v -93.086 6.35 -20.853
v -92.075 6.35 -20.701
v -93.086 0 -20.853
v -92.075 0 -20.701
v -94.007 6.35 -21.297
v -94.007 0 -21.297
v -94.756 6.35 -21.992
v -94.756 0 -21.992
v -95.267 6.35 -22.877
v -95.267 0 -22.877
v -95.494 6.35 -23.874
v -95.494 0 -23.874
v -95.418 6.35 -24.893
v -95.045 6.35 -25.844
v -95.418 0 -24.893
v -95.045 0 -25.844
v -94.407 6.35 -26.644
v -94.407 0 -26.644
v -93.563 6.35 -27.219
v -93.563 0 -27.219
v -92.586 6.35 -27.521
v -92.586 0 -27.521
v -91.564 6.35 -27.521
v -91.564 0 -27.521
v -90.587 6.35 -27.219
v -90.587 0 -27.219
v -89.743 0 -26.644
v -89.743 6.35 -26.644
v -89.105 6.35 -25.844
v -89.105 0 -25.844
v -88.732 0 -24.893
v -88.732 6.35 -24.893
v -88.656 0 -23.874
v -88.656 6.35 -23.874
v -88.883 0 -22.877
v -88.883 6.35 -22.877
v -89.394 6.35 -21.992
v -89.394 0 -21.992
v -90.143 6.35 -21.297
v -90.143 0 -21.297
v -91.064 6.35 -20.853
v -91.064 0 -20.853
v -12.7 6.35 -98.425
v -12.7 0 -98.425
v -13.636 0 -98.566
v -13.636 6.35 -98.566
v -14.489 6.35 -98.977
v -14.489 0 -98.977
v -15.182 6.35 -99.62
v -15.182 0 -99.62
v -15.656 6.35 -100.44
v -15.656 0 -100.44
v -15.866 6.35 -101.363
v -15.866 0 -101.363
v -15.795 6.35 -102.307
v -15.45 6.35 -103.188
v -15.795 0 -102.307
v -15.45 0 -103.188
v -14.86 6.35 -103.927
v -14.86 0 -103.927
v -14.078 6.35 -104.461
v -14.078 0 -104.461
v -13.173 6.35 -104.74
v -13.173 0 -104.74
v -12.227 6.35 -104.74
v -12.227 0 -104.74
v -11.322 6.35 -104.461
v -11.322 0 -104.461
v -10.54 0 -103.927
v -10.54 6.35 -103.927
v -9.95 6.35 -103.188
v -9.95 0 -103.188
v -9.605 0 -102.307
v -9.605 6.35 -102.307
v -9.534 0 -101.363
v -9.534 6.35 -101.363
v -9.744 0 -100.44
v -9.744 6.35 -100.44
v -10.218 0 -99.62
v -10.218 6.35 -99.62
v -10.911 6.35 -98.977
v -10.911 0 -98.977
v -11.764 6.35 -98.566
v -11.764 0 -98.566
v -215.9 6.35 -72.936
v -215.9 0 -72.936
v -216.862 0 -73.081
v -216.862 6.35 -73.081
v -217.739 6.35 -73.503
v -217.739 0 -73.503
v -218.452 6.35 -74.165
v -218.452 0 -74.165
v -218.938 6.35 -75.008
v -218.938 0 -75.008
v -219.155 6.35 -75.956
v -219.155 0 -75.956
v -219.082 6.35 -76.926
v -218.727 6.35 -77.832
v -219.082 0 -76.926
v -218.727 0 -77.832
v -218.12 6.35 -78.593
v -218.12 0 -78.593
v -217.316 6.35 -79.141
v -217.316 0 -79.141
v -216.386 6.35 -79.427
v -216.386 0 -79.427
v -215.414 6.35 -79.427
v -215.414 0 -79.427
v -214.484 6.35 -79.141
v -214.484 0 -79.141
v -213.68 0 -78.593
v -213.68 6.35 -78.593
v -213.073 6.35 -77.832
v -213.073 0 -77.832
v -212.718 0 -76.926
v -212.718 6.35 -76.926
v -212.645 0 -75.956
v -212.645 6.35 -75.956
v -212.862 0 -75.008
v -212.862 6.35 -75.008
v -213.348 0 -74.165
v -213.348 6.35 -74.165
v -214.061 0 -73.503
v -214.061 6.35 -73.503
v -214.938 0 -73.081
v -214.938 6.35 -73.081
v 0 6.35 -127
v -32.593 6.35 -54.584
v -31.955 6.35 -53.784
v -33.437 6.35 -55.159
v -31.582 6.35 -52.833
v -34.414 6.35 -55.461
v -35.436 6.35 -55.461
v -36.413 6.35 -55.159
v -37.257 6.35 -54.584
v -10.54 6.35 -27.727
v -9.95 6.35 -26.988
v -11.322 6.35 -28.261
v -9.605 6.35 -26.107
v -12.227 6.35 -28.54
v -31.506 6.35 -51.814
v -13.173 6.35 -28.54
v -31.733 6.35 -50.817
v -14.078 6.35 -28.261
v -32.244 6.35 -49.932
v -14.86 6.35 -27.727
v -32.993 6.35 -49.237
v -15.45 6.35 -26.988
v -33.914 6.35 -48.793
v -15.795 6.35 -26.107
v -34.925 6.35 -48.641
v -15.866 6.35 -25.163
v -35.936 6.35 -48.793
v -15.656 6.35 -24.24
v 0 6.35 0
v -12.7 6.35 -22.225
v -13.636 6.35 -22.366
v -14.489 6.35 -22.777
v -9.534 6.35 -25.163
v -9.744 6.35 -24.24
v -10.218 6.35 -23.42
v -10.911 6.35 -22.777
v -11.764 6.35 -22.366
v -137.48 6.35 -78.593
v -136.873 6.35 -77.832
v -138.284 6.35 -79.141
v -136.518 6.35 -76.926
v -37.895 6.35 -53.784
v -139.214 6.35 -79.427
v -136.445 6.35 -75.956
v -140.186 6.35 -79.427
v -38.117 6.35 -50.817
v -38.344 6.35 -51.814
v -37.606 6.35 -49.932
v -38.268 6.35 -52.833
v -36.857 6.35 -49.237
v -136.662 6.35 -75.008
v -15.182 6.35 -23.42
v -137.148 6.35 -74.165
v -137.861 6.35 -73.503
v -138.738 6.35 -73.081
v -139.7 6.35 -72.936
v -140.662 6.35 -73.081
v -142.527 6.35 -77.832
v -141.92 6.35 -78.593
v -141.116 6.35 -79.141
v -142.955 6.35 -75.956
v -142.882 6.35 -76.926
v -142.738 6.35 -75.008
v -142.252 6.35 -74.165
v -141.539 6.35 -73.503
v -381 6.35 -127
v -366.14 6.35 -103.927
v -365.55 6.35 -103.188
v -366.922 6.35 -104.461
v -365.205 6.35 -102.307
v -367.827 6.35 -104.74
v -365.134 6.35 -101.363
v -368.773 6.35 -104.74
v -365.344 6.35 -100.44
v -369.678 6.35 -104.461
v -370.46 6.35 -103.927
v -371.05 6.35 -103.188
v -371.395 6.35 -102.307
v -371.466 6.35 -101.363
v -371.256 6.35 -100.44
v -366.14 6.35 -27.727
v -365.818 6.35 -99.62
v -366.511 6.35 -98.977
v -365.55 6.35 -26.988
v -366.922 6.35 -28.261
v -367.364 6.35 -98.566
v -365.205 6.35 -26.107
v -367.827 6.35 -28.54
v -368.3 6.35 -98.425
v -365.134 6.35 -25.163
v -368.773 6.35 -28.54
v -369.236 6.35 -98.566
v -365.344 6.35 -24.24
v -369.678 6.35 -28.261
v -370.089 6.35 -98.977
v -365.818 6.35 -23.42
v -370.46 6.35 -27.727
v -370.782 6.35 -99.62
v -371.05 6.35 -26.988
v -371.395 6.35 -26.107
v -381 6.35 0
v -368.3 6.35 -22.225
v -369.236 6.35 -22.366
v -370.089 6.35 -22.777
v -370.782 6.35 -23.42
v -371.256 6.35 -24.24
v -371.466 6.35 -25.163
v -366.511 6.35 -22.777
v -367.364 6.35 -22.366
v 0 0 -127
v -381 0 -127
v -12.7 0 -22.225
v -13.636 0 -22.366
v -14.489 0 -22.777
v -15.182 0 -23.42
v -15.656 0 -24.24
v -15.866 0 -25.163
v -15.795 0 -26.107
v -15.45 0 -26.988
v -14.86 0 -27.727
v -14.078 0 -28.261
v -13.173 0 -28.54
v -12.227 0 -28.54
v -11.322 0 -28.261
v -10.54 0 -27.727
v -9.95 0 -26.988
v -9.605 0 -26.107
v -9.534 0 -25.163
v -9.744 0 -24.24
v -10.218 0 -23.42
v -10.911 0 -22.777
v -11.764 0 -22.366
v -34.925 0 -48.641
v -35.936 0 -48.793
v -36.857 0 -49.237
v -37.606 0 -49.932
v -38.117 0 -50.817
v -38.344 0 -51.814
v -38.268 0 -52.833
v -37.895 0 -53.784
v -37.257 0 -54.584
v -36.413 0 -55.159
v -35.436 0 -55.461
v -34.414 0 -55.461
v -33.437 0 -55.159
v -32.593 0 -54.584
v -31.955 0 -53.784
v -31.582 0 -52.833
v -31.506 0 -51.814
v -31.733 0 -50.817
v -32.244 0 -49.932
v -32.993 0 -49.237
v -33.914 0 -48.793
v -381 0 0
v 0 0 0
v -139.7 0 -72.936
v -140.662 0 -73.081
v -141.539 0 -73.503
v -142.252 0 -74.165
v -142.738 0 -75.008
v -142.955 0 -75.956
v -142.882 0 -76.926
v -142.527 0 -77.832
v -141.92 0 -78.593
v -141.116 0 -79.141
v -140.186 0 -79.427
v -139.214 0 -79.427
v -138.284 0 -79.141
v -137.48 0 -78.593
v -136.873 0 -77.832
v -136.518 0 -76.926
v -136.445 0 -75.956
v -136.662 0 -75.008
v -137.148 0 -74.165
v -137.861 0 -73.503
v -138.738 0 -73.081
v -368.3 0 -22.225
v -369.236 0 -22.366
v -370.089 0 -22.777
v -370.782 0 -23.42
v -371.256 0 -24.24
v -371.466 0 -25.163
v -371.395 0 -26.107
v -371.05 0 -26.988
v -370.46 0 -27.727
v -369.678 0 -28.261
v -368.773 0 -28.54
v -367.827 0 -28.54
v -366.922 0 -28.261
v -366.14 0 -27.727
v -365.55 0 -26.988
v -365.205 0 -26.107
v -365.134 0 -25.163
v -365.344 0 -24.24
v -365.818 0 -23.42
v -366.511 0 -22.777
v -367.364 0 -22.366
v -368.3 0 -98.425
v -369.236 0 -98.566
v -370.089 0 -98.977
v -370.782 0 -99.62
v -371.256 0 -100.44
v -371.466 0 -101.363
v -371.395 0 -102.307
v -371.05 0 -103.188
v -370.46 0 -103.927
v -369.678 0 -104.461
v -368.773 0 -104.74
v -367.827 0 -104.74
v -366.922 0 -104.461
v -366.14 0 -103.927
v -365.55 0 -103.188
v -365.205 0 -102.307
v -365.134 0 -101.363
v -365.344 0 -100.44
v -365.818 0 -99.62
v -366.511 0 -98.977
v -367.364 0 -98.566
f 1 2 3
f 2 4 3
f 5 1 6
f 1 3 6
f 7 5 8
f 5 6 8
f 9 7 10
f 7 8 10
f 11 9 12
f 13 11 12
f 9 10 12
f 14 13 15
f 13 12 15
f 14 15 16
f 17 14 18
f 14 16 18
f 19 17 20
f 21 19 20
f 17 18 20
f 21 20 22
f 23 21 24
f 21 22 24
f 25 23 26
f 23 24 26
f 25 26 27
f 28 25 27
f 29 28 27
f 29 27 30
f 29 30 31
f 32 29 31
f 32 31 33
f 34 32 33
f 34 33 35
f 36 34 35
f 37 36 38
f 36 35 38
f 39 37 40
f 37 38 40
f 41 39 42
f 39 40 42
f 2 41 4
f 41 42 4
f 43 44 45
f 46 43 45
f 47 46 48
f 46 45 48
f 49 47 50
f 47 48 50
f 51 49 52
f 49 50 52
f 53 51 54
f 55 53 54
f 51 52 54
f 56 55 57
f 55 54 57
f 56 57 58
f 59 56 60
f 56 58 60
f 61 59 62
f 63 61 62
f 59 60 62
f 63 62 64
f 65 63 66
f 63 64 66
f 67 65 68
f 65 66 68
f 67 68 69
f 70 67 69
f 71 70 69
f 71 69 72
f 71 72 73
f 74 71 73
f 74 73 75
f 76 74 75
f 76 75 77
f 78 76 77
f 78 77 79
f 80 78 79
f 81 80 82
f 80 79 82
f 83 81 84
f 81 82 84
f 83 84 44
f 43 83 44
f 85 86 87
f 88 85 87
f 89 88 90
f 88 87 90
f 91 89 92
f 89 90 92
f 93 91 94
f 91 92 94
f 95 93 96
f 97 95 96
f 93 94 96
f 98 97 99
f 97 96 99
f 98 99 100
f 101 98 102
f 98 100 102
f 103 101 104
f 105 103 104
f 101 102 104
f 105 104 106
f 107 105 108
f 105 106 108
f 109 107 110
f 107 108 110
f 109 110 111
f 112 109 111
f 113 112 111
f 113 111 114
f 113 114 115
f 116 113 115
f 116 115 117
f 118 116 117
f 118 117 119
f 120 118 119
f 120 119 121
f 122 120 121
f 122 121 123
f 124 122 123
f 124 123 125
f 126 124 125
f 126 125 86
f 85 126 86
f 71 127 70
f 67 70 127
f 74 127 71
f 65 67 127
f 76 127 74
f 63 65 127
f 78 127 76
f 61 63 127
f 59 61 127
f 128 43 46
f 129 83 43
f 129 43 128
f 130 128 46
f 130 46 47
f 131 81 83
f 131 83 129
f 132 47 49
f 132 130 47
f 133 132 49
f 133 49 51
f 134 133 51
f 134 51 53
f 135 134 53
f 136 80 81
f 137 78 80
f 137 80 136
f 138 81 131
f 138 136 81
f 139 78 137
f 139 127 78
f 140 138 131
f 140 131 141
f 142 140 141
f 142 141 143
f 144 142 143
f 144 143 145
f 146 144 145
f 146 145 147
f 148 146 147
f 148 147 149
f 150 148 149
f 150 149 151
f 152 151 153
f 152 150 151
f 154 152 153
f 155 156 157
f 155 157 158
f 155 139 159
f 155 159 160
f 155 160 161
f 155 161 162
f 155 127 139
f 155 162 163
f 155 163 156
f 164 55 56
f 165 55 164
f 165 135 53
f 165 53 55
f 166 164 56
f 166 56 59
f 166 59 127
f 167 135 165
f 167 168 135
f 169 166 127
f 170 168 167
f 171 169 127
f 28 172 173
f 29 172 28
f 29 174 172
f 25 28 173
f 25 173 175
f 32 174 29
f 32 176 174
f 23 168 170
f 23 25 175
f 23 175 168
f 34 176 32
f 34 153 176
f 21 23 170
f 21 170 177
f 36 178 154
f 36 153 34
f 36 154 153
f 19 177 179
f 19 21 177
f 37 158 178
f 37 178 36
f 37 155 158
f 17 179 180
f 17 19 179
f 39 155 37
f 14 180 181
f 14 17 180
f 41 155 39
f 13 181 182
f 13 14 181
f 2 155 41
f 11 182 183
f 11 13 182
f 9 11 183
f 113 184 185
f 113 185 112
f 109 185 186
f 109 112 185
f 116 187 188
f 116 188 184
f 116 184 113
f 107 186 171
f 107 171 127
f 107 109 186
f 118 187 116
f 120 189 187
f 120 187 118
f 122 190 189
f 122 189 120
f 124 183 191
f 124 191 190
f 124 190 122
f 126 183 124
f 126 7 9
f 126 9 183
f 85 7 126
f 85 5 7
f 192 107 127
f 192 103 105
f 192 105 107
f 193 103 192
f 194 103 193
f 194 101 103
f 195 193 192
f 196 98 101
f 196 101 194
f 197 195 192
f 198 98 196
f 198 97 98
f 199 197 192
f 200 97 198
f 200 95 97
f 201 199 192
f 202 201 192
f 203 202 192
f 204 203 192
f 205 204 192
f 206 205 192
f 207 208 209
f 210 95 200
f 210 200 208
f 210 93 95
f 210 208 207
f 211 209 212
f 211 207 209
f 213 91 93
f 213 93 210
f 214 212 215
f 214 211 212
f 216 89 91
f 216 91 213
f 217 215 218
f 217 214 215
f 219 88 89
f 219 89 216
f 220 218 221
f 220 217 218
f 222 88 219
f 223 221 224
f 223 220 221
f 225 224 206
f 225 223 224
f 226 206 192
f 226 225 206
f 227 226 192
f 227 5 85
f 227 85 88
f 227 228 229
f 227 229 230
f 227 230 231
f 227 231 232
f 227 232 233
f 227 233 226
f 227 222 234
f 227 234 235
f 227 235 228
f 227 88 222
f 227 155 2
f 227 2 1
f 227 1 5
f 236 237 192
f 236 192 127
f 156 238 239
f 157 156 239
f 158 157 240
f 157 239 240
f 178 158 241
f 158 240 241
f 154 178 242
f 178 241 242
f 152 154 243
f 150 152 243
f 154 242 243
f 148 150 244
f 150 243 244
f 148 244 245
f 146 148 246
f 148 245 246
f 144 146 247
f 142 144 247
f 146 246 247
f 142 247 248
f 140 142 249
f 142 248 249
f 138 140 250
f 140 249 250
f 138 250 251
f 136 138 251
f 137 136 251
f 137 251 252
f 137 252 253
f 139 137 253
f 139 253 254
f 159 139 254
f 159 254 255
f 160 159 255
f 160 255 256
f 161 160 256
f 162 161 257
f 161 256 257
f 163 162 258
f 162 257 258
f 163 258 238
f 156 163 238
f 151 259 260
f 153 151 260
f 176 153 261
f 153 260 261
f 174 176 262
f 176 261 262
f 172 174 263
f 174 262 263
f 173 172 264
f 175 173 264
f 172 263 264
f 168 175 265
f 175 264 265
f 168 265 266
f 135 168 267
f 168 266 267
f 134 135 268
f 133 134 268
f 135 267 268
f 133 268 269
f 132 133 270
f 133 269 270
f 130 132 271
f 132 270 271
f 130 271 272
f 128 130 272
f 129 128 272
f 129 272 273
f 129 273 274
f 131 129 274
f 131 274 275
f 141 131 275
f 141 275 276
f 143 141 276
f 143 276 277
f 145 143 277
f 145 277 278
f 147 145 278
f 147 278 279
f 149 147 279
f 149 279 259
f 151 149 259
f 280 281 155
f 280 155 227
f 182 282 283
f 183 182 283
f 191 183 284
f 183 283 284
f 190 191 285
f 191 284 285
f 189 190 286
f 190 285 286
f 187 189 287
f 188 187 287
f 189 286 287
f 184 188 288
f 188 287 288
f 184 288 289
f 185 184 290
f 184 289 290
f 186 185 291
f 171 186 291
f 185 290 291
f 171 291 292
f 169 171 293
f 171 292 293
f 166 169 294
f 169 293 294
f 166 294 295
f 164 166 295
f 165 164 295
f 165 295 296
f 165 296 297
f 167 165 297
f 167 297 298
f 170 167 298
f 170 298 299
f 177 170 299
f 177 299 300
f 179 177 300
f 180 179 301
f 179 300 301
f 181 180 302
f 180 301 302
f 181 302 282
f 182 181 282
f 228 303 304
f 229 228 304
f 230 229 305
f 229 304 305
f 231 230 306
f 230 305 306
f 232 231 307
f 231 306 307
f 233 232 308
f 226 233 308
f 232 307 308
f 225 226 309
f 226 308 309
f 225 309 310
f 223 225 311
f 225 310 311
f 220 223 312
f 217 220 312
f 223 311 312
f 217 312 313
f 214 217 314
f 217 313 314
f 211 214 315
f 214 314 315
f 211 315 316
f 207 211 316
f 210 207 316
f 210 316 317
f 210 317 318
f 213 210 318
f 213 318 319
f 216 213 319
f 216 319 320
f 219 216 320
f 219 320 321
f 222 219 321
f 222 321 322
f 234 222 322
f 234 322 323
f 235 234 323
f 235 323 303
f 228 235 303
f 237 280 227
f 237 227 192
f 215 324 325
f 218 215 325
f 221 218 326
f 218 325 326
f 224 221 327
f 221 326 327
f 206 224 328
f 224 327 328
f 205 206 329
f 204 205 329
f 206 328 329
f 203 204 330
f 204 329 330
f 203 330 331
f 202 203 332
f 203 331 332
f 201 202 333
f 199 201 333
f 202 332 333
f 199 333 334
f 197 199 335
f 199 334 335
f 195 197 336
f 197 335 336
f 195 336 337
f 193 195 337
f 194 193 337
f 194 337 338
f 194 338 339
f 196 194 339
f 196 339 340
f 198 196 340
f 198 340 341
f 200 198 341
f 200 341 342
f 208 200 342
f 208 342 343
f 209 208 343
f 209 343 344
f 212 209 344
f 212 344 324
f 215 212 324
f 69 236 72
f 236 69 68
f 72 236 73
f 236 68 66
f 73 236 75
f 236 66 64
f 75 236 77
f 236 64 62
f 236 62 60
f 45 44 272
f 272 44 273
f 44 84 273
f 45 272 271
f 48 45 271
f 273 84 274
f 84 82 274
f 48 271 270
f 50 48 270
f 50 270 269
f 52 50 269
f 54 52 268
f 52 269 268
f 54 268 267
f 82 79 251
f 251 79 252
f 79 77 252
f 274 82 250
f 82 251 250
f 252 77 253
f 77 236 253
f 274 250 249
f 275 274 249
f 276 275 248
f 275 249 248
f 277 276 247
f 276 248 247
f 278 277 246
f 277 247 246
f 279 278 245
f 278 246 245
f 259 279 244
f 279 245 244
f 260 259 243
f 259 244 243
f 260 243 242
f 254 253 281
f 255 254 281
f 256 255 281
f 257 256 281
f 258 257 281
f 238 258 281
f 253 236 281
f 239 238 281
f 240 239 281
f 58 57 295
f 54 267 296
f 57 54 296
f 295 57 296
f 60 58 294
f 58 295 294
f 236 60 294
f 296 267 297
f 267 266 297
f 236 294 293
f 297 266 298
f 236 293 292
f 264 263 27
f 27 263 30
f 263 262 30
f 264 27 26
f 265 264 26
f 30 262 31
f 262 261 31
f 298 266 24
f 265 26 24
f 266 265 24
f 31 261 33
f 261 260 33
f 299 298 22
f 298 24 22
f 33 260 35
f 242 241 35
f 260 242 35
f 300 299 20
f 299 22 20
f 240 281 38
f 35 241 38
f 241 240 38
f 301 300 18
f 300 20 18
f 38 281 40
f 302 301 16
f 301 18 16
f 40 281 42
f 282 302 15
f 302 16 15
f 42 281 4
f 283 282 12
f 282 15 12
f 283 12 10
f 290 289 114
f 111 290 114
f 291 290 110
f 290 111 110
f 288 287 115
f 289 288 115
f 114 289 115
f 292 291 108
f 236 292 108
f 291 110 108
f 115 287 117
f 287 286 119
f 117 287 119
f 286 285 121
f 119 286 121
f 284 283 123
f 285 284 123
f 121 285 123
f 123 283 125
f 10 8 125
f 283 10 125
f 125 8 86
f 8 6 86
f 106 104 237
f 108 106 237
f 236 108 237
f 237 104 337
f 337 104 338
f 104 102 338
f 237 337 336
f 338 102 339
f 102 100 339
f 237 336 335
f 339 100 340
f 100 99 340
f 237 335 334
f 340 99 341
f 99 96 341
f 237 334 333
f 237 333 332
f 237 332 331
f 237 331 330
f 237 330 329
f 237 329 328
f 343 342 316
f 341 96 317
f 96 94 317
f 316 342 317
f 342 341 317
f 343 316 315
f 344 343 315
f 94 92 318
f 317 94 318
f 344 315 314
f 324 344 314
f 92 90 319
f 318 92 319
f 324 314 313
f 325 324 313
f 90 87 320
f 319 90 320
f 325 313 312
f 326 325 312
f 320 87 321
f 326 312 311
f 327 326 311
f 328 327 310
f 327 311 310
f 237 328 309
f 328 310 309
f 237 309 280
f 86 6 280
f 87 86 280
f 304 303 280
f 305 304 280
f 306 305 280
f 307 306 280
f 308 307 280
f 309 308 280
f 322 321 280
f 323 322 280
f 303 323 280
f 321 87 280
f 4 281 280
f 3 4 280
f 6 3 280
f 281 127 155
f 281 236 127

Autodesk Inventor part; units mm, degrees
ref_plane "YZ Plane" through (0, 0, 0) normal (1, 0, 0) x (0, 1, 0)
ref_plane "XZ Plane" through (0, 0, 0) normal (0, 1, 0) x (-1, 0, 0)
ref_plane "XY Plane" through (0, 0, 0) normal (0, 0, 1) x (1, 0, 0)
sketch "Sketch1" plane through (0, 0, 0) normal (0, 1, 0) x (-1, 0, 0)
  line L0 (0, 0) -> (381, 0)
  line L1 (381, 0) -> (381, -127)
  line L2 (381, -127) -> (0, -127)
  line L3 (0, -127) -> (0, 0)
  dimension "d0" = 381
  dimension "d1" = 127
extrude "Extrusion1" add sketch "Sketch1" along normal blind 6.35
sketch "Sketch2" plane through (0, 6.35, 0) normal (0, 1, 0) x (1, 0, 0)
  line L0 (0, 0) -> (0, 127) projected
  line L1 (0, 127) -> (-381, 127) projected
  line L2 (-381, 127) -> (-381, 0) projected
  point P0 (-368.3, 101.6)
  point P1 (-368.3, 25.4)
  point P2 (-12.7, 101.6)
  point P3 (-12.7, 25.4)
  dimension "d4" = 12.7
  dimension "d5" = 12.7
  dimension "d6" = 76.2
  dimension "d7" = 25.4
hole "Hole1" at (-368.3, 6.35, -101.6) at (-368.3, 6.35, -25.4) at (-12.7, 6.35, -101.6) at (-12.7, 6.35, -25.4) direction (0, -1, 0) diameter 6.35 end through all
sketch "Sketch3" plane through (0, 6.35, 0) normal (0, 1, 0) x (1, 0, 0)
  line L0 (0, 127) -> (-381, 127) projected
  line L1 (-381, 127) -> (-381, 0) projected
  point P0 (-215.9, 76.2)
  point P1 (-139.7, 76.2)
  dimension "d15" = 76.2
  dimension "d16" = 50.8
  dimension "d17" = 165.1
hole "Hole2" at (-215.9, 6.35, -76.2) at (-139.7, 6.35, -76.2) direction (0, -1, 0) diameter 6.5278 end through all
sketch "Sketch4" plane through (0, 6.35, 0) normal (0, 1, 0) x (1, 0, 0)
  line L0 (-381, 0) -> (0, 0) projected
  line L1 (0, 0) -> (0, 127) projected
  point P0 (-92.075, 24.13)
  point P1 (-34.925, 52.07)
  dimension "d25" = 57.15
  dimension "d26" = 27.94
  dimension "d27" = 24.13
  dimension "d28" = 34.925
hole "Hole3" at (-92.075, 6.35, -24.13) at (-34.925, 6.35, -52.07) direction (0, -1, 0) diameter 6.858 end through all
properties part number "Power Mount Plate" material "Aluminum 6061"
